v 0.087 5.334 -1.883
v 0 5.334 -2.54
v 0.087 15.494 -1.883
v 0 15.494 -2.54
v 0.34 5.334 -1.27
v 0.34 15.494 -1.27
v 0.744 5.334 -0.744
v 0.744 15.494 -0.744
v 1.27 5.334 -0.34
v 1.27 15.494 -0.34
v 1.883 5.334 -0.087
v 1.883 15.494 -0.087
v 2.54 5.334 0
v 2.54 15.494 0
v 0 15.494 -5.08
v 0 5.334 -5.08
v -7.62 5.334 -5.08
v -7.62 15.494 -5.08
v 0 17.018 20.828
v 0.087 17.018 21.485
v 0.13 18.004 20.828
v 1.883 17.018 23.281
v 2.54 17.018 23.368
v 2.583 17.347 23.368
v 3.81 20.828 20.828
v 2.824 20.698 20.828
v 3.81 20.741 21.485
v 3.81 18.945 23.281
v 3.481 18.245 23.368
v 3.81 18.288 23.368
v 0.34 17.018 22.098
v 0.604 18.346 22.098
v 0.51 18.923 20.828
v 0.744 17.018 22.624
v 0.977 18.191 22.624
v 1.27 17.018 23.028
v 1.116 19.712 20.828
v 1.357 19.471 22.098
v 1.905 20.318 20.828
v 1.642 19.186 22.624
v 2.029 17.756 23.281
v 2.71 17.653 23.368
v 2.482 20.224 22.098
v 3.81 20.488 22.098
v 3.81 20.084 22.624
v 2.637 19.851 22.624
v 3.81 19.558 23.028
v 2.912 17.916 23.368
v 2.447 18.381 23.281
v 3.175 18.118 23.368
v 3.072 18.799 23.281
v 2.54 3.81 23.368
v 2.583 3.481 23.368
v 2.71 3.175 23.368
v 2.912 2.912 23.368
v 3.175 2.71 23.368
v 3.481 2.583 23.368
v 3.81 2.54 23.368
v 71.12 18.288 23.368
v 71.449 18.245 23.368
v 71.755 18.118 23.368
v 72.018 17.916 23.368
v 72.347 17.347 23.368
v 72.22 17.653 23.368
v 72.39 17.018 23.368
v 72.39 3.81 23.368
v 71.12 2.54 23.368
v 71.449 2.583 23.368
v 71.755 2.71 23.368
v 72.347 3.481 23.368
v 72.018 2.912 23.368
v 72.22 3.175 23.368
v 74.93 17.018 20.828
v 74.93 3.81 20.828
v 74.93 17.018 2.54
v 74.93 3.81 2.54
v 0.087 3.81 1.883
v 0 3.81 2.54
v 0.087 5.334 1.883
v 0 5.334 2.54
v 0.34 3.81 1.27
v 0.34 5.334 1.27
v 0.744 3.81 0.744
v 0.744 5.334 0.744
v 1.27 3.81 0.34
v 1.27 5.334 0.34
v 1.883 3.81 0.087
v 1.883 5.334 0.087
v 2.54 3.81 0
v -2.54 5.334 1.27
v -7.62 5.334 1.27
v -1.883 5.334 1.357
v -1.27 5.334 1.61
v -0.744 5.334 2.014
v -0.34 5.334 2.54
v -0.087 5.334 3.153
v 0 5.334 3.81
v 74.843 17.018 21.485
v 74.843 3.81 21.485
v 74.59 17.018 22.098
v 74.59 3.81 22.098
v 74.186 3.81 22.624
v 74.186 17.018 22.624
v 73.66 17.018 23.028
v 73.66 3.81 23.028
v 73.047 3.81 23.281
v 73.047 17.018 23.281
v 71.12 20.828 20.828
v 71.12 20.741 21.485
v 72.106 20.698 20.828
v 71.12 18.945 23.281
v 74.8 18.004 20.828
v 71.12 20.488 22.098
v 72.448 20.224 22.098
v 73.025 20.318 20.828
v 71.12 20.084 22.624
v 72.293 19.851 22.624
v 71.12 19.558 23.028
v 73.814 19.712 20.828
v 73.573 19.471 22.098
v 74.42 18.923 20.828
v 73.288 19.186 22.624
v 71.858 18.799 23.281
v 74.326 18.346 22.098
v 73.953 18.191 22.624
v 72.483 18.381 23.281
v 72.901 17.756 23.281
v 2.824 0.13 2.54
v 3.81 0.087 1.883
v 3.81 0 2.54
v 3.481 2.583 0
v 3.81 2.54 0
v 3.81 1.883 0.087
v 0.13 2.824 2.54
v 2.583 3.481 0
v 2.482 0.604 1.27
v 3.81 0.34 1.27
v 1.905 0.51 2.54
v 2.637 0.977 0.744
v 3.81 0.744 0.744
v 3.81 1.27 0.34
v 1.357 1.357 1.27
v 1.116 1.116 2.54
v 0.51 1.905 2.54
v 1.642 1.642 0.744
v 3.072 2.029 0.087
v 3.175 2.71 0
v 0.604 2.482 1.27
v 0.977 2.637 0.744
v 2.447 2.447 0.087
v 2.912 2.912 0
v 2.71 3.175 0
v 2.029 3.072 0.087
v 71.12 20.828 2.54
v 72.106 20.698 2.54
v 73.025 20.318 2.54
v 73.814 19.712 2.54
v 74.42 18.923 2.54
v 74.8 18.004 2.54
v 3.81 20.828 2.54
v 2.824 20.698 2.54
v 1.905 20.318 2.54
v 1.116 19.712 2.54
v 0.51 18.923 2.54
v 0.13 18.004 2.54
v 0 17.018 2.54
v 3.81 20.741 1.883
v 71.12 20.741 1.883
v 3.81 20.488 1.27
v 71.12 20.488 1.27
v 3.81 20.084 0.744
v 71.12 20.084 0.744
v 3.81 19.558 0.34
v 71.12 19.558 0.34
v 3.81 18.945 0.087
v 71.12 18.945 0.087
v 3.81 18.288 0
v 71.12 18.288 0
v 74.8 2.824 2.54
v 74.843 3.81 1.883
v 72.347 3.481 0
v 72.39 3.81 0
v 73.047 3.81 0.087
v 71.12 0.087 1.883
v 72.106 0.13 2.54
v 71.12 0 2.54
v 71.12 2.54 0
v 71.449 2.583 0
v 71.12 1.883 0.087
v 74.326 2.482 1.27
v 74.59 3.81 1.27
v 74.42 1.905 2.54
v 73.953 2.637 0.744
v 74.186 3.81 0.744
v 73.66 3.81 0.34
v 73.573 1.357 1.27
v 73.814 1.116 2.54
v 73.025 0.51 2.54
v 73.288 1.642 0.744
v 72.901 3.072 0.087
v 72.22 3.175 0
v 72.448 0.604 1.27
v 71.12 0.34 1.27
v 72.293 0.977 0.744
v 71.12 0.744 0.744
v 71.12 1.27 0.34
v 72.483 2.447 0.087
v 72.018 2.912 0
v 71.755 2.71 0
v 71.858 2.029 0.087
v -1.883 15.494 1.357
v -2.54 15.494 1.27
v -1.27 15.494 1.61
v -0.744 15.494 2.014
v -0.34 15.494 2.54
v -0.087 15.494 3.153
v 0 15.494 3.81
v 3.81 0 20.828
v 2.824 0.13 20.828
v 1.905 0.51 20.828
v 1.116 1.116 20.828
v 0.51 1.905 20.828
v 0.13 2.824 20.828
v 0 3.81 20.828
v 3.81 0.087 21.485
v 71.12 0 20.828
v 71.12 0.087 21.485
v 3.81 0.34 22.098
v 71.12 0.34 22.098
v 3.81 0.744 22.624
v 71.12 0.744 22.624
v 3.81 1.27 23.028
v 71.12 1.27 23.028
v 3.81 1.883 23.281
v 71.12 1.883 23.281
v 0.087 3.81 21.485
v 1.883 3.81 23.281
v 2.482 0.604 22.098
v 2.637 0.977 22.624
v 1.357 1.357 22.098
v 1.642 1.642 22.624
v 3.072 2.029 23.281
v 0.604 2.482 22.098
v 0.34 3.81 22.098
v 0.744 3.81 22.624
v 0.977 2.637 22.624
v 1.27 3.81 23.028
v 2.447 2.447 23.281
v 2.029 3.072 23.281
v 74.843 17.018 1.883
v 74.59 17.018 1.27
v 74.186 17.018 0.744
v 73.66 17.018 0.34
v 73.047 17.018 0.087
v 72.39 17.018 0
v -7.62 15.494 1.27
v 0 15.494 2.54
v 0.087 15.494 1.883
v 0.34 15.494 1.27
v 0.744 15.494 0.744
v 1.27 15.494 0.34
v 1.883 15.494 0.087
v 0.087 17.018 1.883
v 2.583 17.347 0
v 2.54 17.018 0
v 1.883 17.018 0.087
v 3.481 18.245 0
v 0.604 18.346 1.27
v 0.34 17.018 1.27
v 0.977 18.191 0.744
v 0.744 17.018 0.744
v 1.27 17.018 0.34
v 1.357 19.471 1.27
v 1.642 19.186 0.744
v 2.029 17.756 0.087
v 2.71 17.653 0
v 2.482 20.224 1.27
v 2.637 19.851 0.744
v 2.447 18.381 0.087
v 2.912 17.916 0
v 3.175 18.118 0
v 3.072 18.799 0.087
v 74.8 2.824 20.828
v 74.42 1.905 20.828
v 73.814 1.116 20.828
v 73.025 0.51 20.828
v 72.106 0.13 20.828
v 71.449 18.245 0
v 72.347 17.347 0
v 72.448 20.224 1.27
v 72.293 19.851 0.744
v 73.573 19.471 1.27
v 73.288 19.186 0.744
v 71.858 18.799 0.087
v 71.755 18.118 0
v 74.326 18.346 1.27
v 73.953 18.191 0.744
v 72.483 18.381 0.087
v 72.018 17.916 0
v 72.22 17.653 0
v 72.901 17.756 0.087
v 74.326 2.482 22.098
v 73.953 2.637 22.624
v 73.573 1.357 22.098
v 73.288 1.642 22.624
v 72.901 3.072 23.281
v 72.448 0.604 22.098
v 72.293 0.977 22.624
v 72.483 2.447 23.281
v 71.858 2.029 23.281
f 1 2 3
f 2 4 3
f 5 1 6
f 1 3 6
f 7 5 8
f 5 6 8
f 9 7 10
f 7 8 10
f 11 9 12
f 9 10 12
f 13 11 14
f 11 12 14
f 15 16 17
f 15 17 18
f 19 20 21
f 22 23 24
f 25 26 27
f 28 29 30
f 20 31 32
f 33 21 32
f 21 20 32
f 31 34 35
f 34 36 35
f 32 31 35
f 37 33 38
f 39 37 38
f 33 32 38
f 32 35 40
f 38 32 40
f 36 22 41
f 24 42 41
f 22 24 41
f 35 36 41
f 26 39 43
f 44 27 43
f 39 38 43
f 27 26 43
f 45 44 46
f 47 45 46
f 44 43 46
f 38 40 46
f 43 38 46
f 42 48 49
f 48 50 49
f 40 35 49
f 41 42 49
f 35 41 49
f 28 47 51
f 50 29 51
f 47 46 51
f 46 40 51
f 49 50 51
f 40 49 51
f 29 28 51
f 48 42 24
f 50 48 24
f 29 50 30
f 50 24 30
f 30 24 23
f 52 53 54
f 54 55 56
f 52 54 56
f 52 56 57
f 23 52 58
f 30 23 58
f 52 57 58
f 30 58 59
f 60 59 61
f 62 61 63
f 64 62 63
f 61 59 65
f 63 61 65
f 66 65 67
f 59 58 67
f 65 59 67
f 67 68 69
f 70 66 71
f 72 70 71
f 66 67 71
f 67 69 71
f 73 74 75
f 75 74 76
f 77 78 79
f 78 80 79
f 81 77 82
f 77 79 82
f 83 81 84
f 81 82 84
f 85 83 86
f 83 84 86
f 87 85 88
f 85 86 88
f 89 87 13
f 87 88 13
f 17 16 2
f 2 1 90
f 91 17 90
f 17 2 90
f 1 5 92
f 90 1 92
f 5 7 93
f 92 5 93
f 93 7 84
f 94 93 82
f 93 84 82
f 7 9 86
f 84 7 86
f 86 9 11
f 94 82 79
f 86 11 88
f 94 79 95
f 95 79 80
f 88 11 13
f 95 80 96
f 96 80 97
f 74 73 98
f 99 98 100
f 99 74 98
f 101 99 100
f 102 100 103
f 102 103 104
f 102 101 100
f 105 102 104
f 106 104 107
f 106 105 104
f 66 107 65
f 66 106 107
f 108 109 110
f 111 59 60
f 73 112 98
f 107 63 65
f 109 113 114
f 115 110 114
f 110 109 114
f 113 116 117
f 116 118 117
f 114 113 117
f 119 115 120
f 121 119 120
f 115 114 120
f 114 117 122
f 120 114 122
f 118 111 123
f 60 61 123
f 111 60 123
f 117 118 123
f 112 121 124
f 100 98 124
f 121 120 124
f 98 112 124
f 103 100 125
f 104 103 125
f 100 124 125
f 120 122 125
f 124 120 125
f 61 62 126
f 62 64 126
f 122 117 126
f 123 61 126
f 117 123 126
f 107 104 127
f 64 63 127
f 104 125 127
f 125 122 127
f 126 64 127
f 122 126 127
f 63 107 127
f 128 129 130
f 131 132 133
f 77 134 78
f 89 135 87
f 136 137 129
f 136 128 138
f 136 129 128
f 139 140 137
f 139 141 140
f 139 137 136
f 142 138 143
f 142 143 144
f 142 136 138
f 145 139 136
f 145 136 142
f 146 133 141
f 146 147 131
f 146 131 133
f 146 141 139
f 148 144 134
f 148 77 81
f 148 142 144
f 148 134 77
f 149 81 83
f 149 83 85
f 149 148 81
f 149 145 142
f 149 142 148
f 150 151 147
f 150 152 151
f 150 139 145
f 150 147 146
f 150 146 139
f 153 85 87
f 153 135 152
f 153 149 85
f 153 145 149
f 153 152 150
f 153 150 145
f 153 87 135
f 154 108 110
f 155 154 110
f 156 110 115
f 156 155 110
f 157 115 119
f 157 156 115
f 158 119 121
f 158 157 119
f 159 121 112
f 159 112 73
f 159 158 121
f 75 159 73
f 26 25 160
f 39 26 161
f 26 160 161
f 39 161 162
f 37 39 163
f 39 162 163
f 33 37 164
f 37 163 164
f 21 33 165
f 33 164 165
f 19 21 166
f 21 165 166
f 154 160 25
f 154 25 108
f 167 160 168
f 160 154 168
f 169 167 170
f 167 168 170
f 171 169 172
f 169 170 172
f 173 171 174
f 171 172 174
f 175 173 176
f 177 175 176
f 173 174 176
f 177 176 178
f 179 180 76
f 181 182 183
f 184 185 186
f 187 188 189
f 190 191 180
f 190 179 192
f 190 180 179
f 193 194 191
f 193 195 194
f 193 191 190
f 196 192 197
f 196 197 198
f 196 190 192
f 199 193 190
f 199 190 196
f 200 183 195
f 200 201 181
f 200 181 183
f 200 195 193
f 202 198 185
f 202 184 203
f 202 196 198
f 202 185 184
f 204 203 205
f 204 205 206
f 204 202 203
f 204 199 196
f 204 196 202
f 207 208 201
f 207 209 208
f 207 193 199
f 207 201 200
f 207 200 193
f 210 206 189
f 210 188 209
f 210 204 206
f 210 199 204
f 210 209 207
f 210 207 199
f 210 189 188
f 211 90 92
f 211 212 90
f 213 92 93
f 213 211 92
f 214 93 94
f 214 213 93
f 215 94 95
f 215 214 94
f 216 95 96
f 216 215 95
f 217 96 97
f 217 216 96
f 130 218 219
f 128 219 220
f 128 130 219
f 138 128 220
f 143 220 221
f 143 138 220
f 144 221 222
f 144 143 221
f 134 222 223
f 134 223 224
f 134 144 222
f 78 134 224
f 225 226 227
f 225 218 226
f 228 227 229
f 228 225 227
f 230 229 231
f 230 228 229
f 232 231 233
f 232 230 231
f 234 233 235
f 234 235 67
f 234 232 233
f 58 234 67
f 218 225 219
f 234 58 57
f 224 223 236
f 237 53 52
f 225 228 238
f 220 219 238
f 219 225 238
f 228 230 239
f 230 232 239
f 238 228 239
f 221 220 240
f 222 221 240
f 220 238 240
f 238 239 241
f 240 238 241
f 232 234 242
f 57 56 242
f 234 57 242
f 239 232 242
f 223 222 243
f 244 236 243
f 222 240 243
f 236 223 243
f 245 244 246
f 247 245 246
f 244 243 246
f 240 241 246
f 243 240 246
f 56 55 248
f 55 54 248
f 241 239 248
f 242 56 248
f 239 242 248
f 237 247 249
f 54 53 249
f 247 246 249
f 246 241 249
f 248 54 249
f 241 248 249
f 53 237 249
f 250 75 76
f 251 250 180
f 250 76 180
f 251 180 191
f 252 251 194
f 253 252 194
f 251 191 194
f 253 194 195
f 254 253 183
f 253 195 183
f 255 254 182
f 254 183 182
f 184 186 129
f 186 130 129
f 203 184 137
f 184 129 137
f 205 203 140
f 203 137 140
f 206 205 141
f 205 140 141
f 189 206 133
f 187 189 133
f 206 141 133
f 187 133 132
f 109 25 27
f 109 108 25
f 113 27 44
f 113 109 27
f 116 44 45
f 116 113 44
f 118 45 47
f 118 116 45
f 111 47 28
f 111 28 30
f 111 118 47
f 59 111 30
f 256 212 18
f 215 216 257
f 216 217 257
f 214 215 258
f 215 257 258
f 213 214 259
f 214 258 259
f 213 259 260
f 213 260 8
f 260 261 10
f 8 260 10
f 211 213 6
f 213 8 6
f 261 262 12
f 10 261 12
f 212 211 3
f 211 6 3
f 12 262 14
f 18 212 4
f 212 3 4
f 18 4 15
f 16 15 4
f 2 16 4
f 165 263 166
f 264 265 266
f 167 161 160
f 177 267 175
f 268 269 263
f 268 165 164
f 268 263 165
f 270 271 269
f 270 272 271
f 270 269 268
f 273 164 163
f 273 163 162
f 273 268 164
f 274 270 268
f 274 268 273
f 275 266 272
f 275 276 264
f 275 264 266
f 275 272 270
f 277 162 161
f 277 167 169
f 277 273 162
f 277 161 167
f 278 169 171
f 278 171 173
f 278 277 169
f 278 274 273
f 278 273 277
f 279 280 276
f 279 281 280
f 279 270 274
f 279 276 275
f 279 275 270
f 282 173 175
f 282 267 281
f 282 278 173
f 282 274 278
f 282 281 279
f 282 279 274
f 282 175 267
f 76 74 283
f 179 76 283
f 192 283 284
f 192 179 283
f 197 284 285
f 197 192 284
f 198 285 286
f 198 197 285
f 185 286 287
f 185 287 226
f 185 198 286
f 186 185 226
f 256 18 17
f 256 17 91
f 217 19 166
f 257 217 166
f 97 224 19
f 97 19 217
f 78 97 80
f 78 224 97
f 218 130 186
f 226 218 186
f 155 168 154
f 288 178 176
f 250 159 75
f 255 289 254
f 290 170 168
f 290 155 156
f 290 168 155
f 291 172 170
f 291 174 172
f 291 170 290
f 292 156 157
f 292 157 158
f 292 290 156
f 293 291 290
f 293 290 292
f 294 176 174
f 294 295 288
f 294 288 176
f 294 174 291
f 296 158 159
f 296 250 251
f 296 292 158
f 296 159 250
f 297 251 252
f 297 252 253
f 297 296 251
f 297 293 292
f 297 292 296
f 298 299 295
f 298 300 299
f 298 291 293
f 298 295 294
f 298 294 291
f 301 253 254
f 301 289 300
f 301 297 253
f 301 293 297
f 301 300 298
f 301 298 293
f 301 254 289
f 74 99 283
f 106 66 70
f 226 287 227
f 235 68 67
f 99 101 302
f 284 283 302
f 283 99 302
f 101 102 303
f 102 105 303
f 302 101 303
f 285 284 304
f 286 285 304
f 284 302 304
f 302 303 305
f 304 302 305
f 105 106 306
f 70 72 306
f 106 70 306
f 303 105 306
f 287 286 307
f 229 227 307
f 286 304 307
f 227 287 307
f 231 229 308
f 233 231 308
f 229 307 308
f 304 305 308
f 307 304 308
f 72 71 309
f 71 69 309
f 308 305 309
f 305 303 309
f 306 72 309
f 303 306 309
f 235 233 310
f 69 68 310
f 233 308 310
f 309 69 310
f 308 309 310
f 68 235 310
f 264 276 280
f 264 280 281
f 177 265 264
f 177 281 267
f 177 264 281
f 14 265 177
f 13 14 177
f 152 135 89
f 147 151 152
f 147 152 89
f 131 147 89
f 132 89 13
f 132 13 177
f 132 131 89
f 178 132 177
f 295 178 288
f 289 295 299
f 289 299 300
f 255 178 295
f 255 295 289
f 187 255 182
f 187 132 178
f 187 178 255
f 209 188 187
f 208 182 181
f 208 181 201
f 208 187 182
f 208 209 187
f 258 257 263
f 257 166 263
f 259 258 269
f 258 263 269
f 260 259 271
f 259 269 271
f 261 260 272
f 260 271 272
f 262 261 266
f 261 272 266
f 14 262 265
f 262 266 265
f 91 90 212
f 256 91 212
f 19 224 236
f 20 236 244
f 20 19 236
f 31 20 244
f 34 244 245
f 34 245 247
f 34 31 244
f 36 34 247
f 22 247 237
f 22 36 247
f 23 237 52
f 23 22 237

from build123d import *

# Parameters (mm, degrees)
SKETCH1_W           = 74.93
SKETCH1_H           = 23.368
BOSS_EXTRUDE1_DEPTH = 20.828
SKETCH2_W           = 5.08
SKETCH2_H           = 10.16
SKETCH2_W_2         = 1.27
BOSS_EXTRUDE2_DEPTH = 7.62
FILLET1_R           = 2.54
FILLET2_R           = 3.81
FILLET3_R           = 2.54
FILLET4_R           = 2.54


with BuildPart() as part:
    # Sketch1 → Boss-Extrude1 (new body)
    with BuildSketch(Plane(origin=(0, 0, 0), x_dir=(1, 0, 0), z_dir=(0, 1, 0))):
        with Locations((37.465, -11.684)):
            Rectangle(SKETCH1_W, SKETCH1_H)
    extrude(amount=BOSS_EXTRUDE1_DEPTH)

    # Sketch2 → Boss-Extrude2 (add)
    with BuildSketch(Plane.ZY):
        with Locations((-2.54, 10.414)):
            Rectangle(SKETCH2_W, SKETCH2_H)
        with Locations((0.635, 10.414)):
            Rectangle(SKETCH2_W_2, SKETCH2_H)
    extrude(amount=BOSS_EXTRUDE2_DEPTH)

    # Fillet1
    fillet1_edges = [part.edges().sort_by_distance(p)[0] for p in [
        (0, 10.414, 0),
        (0, 10.414, 1.27),
    ]]
    fillet(fillet1_edges, radius=FILLET1_R)

    # Fillet2
    fillet2_edges = [part.edges().sort_by_distance(p)[0] for p in [
        (74.93, 20.828, 11.684),
        (0, 20.828, 11.684),
        (74.93, 0, 11.684),
        (0, 0, 11.684),
    ]]
    fillet(fillet2_edges, radius=FILLET2_R)

    # Fillet3
    fillet3_edges = [part.edges().sort_by_distance(p)[0] for p in [
        (37.465, 20.828, 23.368),
        (37.465, 0, 23.368),
        (74.93, 10.414, 23.368),
        (0, 10.414, 23.368),
        (1.115923164, 1.115923164, 23.368),
        (73.814076836, 1.115923164, 23.368),
        (73.814076836, 19.712076836, 23.368),
        (1.115923164, 19.712076836, 23.368),
    ]]
    fillet(fillet3_edges, radius=FILLET3_R)

    # Fillet4
    fillet4_edges = [part.edges().sort_by_distance(p)[0] for p in [
        (0, 16.256, 0),
        (1.115923164, 19.712076836, 0),
        (37.465, 20.828, 0),
        (73.814076836, 19.712076836, 0),
        (74.93, 10.414, 0),
        (73.814076836, 1.115923164, 0),
        (0, 4.572, 0),
        (1.115923164, 1.115923164, 0),
        (37.465, 0, 0),
    ]]
    fillet(fillet4_edges, radius=FILLET4_R)


solid = part.part
